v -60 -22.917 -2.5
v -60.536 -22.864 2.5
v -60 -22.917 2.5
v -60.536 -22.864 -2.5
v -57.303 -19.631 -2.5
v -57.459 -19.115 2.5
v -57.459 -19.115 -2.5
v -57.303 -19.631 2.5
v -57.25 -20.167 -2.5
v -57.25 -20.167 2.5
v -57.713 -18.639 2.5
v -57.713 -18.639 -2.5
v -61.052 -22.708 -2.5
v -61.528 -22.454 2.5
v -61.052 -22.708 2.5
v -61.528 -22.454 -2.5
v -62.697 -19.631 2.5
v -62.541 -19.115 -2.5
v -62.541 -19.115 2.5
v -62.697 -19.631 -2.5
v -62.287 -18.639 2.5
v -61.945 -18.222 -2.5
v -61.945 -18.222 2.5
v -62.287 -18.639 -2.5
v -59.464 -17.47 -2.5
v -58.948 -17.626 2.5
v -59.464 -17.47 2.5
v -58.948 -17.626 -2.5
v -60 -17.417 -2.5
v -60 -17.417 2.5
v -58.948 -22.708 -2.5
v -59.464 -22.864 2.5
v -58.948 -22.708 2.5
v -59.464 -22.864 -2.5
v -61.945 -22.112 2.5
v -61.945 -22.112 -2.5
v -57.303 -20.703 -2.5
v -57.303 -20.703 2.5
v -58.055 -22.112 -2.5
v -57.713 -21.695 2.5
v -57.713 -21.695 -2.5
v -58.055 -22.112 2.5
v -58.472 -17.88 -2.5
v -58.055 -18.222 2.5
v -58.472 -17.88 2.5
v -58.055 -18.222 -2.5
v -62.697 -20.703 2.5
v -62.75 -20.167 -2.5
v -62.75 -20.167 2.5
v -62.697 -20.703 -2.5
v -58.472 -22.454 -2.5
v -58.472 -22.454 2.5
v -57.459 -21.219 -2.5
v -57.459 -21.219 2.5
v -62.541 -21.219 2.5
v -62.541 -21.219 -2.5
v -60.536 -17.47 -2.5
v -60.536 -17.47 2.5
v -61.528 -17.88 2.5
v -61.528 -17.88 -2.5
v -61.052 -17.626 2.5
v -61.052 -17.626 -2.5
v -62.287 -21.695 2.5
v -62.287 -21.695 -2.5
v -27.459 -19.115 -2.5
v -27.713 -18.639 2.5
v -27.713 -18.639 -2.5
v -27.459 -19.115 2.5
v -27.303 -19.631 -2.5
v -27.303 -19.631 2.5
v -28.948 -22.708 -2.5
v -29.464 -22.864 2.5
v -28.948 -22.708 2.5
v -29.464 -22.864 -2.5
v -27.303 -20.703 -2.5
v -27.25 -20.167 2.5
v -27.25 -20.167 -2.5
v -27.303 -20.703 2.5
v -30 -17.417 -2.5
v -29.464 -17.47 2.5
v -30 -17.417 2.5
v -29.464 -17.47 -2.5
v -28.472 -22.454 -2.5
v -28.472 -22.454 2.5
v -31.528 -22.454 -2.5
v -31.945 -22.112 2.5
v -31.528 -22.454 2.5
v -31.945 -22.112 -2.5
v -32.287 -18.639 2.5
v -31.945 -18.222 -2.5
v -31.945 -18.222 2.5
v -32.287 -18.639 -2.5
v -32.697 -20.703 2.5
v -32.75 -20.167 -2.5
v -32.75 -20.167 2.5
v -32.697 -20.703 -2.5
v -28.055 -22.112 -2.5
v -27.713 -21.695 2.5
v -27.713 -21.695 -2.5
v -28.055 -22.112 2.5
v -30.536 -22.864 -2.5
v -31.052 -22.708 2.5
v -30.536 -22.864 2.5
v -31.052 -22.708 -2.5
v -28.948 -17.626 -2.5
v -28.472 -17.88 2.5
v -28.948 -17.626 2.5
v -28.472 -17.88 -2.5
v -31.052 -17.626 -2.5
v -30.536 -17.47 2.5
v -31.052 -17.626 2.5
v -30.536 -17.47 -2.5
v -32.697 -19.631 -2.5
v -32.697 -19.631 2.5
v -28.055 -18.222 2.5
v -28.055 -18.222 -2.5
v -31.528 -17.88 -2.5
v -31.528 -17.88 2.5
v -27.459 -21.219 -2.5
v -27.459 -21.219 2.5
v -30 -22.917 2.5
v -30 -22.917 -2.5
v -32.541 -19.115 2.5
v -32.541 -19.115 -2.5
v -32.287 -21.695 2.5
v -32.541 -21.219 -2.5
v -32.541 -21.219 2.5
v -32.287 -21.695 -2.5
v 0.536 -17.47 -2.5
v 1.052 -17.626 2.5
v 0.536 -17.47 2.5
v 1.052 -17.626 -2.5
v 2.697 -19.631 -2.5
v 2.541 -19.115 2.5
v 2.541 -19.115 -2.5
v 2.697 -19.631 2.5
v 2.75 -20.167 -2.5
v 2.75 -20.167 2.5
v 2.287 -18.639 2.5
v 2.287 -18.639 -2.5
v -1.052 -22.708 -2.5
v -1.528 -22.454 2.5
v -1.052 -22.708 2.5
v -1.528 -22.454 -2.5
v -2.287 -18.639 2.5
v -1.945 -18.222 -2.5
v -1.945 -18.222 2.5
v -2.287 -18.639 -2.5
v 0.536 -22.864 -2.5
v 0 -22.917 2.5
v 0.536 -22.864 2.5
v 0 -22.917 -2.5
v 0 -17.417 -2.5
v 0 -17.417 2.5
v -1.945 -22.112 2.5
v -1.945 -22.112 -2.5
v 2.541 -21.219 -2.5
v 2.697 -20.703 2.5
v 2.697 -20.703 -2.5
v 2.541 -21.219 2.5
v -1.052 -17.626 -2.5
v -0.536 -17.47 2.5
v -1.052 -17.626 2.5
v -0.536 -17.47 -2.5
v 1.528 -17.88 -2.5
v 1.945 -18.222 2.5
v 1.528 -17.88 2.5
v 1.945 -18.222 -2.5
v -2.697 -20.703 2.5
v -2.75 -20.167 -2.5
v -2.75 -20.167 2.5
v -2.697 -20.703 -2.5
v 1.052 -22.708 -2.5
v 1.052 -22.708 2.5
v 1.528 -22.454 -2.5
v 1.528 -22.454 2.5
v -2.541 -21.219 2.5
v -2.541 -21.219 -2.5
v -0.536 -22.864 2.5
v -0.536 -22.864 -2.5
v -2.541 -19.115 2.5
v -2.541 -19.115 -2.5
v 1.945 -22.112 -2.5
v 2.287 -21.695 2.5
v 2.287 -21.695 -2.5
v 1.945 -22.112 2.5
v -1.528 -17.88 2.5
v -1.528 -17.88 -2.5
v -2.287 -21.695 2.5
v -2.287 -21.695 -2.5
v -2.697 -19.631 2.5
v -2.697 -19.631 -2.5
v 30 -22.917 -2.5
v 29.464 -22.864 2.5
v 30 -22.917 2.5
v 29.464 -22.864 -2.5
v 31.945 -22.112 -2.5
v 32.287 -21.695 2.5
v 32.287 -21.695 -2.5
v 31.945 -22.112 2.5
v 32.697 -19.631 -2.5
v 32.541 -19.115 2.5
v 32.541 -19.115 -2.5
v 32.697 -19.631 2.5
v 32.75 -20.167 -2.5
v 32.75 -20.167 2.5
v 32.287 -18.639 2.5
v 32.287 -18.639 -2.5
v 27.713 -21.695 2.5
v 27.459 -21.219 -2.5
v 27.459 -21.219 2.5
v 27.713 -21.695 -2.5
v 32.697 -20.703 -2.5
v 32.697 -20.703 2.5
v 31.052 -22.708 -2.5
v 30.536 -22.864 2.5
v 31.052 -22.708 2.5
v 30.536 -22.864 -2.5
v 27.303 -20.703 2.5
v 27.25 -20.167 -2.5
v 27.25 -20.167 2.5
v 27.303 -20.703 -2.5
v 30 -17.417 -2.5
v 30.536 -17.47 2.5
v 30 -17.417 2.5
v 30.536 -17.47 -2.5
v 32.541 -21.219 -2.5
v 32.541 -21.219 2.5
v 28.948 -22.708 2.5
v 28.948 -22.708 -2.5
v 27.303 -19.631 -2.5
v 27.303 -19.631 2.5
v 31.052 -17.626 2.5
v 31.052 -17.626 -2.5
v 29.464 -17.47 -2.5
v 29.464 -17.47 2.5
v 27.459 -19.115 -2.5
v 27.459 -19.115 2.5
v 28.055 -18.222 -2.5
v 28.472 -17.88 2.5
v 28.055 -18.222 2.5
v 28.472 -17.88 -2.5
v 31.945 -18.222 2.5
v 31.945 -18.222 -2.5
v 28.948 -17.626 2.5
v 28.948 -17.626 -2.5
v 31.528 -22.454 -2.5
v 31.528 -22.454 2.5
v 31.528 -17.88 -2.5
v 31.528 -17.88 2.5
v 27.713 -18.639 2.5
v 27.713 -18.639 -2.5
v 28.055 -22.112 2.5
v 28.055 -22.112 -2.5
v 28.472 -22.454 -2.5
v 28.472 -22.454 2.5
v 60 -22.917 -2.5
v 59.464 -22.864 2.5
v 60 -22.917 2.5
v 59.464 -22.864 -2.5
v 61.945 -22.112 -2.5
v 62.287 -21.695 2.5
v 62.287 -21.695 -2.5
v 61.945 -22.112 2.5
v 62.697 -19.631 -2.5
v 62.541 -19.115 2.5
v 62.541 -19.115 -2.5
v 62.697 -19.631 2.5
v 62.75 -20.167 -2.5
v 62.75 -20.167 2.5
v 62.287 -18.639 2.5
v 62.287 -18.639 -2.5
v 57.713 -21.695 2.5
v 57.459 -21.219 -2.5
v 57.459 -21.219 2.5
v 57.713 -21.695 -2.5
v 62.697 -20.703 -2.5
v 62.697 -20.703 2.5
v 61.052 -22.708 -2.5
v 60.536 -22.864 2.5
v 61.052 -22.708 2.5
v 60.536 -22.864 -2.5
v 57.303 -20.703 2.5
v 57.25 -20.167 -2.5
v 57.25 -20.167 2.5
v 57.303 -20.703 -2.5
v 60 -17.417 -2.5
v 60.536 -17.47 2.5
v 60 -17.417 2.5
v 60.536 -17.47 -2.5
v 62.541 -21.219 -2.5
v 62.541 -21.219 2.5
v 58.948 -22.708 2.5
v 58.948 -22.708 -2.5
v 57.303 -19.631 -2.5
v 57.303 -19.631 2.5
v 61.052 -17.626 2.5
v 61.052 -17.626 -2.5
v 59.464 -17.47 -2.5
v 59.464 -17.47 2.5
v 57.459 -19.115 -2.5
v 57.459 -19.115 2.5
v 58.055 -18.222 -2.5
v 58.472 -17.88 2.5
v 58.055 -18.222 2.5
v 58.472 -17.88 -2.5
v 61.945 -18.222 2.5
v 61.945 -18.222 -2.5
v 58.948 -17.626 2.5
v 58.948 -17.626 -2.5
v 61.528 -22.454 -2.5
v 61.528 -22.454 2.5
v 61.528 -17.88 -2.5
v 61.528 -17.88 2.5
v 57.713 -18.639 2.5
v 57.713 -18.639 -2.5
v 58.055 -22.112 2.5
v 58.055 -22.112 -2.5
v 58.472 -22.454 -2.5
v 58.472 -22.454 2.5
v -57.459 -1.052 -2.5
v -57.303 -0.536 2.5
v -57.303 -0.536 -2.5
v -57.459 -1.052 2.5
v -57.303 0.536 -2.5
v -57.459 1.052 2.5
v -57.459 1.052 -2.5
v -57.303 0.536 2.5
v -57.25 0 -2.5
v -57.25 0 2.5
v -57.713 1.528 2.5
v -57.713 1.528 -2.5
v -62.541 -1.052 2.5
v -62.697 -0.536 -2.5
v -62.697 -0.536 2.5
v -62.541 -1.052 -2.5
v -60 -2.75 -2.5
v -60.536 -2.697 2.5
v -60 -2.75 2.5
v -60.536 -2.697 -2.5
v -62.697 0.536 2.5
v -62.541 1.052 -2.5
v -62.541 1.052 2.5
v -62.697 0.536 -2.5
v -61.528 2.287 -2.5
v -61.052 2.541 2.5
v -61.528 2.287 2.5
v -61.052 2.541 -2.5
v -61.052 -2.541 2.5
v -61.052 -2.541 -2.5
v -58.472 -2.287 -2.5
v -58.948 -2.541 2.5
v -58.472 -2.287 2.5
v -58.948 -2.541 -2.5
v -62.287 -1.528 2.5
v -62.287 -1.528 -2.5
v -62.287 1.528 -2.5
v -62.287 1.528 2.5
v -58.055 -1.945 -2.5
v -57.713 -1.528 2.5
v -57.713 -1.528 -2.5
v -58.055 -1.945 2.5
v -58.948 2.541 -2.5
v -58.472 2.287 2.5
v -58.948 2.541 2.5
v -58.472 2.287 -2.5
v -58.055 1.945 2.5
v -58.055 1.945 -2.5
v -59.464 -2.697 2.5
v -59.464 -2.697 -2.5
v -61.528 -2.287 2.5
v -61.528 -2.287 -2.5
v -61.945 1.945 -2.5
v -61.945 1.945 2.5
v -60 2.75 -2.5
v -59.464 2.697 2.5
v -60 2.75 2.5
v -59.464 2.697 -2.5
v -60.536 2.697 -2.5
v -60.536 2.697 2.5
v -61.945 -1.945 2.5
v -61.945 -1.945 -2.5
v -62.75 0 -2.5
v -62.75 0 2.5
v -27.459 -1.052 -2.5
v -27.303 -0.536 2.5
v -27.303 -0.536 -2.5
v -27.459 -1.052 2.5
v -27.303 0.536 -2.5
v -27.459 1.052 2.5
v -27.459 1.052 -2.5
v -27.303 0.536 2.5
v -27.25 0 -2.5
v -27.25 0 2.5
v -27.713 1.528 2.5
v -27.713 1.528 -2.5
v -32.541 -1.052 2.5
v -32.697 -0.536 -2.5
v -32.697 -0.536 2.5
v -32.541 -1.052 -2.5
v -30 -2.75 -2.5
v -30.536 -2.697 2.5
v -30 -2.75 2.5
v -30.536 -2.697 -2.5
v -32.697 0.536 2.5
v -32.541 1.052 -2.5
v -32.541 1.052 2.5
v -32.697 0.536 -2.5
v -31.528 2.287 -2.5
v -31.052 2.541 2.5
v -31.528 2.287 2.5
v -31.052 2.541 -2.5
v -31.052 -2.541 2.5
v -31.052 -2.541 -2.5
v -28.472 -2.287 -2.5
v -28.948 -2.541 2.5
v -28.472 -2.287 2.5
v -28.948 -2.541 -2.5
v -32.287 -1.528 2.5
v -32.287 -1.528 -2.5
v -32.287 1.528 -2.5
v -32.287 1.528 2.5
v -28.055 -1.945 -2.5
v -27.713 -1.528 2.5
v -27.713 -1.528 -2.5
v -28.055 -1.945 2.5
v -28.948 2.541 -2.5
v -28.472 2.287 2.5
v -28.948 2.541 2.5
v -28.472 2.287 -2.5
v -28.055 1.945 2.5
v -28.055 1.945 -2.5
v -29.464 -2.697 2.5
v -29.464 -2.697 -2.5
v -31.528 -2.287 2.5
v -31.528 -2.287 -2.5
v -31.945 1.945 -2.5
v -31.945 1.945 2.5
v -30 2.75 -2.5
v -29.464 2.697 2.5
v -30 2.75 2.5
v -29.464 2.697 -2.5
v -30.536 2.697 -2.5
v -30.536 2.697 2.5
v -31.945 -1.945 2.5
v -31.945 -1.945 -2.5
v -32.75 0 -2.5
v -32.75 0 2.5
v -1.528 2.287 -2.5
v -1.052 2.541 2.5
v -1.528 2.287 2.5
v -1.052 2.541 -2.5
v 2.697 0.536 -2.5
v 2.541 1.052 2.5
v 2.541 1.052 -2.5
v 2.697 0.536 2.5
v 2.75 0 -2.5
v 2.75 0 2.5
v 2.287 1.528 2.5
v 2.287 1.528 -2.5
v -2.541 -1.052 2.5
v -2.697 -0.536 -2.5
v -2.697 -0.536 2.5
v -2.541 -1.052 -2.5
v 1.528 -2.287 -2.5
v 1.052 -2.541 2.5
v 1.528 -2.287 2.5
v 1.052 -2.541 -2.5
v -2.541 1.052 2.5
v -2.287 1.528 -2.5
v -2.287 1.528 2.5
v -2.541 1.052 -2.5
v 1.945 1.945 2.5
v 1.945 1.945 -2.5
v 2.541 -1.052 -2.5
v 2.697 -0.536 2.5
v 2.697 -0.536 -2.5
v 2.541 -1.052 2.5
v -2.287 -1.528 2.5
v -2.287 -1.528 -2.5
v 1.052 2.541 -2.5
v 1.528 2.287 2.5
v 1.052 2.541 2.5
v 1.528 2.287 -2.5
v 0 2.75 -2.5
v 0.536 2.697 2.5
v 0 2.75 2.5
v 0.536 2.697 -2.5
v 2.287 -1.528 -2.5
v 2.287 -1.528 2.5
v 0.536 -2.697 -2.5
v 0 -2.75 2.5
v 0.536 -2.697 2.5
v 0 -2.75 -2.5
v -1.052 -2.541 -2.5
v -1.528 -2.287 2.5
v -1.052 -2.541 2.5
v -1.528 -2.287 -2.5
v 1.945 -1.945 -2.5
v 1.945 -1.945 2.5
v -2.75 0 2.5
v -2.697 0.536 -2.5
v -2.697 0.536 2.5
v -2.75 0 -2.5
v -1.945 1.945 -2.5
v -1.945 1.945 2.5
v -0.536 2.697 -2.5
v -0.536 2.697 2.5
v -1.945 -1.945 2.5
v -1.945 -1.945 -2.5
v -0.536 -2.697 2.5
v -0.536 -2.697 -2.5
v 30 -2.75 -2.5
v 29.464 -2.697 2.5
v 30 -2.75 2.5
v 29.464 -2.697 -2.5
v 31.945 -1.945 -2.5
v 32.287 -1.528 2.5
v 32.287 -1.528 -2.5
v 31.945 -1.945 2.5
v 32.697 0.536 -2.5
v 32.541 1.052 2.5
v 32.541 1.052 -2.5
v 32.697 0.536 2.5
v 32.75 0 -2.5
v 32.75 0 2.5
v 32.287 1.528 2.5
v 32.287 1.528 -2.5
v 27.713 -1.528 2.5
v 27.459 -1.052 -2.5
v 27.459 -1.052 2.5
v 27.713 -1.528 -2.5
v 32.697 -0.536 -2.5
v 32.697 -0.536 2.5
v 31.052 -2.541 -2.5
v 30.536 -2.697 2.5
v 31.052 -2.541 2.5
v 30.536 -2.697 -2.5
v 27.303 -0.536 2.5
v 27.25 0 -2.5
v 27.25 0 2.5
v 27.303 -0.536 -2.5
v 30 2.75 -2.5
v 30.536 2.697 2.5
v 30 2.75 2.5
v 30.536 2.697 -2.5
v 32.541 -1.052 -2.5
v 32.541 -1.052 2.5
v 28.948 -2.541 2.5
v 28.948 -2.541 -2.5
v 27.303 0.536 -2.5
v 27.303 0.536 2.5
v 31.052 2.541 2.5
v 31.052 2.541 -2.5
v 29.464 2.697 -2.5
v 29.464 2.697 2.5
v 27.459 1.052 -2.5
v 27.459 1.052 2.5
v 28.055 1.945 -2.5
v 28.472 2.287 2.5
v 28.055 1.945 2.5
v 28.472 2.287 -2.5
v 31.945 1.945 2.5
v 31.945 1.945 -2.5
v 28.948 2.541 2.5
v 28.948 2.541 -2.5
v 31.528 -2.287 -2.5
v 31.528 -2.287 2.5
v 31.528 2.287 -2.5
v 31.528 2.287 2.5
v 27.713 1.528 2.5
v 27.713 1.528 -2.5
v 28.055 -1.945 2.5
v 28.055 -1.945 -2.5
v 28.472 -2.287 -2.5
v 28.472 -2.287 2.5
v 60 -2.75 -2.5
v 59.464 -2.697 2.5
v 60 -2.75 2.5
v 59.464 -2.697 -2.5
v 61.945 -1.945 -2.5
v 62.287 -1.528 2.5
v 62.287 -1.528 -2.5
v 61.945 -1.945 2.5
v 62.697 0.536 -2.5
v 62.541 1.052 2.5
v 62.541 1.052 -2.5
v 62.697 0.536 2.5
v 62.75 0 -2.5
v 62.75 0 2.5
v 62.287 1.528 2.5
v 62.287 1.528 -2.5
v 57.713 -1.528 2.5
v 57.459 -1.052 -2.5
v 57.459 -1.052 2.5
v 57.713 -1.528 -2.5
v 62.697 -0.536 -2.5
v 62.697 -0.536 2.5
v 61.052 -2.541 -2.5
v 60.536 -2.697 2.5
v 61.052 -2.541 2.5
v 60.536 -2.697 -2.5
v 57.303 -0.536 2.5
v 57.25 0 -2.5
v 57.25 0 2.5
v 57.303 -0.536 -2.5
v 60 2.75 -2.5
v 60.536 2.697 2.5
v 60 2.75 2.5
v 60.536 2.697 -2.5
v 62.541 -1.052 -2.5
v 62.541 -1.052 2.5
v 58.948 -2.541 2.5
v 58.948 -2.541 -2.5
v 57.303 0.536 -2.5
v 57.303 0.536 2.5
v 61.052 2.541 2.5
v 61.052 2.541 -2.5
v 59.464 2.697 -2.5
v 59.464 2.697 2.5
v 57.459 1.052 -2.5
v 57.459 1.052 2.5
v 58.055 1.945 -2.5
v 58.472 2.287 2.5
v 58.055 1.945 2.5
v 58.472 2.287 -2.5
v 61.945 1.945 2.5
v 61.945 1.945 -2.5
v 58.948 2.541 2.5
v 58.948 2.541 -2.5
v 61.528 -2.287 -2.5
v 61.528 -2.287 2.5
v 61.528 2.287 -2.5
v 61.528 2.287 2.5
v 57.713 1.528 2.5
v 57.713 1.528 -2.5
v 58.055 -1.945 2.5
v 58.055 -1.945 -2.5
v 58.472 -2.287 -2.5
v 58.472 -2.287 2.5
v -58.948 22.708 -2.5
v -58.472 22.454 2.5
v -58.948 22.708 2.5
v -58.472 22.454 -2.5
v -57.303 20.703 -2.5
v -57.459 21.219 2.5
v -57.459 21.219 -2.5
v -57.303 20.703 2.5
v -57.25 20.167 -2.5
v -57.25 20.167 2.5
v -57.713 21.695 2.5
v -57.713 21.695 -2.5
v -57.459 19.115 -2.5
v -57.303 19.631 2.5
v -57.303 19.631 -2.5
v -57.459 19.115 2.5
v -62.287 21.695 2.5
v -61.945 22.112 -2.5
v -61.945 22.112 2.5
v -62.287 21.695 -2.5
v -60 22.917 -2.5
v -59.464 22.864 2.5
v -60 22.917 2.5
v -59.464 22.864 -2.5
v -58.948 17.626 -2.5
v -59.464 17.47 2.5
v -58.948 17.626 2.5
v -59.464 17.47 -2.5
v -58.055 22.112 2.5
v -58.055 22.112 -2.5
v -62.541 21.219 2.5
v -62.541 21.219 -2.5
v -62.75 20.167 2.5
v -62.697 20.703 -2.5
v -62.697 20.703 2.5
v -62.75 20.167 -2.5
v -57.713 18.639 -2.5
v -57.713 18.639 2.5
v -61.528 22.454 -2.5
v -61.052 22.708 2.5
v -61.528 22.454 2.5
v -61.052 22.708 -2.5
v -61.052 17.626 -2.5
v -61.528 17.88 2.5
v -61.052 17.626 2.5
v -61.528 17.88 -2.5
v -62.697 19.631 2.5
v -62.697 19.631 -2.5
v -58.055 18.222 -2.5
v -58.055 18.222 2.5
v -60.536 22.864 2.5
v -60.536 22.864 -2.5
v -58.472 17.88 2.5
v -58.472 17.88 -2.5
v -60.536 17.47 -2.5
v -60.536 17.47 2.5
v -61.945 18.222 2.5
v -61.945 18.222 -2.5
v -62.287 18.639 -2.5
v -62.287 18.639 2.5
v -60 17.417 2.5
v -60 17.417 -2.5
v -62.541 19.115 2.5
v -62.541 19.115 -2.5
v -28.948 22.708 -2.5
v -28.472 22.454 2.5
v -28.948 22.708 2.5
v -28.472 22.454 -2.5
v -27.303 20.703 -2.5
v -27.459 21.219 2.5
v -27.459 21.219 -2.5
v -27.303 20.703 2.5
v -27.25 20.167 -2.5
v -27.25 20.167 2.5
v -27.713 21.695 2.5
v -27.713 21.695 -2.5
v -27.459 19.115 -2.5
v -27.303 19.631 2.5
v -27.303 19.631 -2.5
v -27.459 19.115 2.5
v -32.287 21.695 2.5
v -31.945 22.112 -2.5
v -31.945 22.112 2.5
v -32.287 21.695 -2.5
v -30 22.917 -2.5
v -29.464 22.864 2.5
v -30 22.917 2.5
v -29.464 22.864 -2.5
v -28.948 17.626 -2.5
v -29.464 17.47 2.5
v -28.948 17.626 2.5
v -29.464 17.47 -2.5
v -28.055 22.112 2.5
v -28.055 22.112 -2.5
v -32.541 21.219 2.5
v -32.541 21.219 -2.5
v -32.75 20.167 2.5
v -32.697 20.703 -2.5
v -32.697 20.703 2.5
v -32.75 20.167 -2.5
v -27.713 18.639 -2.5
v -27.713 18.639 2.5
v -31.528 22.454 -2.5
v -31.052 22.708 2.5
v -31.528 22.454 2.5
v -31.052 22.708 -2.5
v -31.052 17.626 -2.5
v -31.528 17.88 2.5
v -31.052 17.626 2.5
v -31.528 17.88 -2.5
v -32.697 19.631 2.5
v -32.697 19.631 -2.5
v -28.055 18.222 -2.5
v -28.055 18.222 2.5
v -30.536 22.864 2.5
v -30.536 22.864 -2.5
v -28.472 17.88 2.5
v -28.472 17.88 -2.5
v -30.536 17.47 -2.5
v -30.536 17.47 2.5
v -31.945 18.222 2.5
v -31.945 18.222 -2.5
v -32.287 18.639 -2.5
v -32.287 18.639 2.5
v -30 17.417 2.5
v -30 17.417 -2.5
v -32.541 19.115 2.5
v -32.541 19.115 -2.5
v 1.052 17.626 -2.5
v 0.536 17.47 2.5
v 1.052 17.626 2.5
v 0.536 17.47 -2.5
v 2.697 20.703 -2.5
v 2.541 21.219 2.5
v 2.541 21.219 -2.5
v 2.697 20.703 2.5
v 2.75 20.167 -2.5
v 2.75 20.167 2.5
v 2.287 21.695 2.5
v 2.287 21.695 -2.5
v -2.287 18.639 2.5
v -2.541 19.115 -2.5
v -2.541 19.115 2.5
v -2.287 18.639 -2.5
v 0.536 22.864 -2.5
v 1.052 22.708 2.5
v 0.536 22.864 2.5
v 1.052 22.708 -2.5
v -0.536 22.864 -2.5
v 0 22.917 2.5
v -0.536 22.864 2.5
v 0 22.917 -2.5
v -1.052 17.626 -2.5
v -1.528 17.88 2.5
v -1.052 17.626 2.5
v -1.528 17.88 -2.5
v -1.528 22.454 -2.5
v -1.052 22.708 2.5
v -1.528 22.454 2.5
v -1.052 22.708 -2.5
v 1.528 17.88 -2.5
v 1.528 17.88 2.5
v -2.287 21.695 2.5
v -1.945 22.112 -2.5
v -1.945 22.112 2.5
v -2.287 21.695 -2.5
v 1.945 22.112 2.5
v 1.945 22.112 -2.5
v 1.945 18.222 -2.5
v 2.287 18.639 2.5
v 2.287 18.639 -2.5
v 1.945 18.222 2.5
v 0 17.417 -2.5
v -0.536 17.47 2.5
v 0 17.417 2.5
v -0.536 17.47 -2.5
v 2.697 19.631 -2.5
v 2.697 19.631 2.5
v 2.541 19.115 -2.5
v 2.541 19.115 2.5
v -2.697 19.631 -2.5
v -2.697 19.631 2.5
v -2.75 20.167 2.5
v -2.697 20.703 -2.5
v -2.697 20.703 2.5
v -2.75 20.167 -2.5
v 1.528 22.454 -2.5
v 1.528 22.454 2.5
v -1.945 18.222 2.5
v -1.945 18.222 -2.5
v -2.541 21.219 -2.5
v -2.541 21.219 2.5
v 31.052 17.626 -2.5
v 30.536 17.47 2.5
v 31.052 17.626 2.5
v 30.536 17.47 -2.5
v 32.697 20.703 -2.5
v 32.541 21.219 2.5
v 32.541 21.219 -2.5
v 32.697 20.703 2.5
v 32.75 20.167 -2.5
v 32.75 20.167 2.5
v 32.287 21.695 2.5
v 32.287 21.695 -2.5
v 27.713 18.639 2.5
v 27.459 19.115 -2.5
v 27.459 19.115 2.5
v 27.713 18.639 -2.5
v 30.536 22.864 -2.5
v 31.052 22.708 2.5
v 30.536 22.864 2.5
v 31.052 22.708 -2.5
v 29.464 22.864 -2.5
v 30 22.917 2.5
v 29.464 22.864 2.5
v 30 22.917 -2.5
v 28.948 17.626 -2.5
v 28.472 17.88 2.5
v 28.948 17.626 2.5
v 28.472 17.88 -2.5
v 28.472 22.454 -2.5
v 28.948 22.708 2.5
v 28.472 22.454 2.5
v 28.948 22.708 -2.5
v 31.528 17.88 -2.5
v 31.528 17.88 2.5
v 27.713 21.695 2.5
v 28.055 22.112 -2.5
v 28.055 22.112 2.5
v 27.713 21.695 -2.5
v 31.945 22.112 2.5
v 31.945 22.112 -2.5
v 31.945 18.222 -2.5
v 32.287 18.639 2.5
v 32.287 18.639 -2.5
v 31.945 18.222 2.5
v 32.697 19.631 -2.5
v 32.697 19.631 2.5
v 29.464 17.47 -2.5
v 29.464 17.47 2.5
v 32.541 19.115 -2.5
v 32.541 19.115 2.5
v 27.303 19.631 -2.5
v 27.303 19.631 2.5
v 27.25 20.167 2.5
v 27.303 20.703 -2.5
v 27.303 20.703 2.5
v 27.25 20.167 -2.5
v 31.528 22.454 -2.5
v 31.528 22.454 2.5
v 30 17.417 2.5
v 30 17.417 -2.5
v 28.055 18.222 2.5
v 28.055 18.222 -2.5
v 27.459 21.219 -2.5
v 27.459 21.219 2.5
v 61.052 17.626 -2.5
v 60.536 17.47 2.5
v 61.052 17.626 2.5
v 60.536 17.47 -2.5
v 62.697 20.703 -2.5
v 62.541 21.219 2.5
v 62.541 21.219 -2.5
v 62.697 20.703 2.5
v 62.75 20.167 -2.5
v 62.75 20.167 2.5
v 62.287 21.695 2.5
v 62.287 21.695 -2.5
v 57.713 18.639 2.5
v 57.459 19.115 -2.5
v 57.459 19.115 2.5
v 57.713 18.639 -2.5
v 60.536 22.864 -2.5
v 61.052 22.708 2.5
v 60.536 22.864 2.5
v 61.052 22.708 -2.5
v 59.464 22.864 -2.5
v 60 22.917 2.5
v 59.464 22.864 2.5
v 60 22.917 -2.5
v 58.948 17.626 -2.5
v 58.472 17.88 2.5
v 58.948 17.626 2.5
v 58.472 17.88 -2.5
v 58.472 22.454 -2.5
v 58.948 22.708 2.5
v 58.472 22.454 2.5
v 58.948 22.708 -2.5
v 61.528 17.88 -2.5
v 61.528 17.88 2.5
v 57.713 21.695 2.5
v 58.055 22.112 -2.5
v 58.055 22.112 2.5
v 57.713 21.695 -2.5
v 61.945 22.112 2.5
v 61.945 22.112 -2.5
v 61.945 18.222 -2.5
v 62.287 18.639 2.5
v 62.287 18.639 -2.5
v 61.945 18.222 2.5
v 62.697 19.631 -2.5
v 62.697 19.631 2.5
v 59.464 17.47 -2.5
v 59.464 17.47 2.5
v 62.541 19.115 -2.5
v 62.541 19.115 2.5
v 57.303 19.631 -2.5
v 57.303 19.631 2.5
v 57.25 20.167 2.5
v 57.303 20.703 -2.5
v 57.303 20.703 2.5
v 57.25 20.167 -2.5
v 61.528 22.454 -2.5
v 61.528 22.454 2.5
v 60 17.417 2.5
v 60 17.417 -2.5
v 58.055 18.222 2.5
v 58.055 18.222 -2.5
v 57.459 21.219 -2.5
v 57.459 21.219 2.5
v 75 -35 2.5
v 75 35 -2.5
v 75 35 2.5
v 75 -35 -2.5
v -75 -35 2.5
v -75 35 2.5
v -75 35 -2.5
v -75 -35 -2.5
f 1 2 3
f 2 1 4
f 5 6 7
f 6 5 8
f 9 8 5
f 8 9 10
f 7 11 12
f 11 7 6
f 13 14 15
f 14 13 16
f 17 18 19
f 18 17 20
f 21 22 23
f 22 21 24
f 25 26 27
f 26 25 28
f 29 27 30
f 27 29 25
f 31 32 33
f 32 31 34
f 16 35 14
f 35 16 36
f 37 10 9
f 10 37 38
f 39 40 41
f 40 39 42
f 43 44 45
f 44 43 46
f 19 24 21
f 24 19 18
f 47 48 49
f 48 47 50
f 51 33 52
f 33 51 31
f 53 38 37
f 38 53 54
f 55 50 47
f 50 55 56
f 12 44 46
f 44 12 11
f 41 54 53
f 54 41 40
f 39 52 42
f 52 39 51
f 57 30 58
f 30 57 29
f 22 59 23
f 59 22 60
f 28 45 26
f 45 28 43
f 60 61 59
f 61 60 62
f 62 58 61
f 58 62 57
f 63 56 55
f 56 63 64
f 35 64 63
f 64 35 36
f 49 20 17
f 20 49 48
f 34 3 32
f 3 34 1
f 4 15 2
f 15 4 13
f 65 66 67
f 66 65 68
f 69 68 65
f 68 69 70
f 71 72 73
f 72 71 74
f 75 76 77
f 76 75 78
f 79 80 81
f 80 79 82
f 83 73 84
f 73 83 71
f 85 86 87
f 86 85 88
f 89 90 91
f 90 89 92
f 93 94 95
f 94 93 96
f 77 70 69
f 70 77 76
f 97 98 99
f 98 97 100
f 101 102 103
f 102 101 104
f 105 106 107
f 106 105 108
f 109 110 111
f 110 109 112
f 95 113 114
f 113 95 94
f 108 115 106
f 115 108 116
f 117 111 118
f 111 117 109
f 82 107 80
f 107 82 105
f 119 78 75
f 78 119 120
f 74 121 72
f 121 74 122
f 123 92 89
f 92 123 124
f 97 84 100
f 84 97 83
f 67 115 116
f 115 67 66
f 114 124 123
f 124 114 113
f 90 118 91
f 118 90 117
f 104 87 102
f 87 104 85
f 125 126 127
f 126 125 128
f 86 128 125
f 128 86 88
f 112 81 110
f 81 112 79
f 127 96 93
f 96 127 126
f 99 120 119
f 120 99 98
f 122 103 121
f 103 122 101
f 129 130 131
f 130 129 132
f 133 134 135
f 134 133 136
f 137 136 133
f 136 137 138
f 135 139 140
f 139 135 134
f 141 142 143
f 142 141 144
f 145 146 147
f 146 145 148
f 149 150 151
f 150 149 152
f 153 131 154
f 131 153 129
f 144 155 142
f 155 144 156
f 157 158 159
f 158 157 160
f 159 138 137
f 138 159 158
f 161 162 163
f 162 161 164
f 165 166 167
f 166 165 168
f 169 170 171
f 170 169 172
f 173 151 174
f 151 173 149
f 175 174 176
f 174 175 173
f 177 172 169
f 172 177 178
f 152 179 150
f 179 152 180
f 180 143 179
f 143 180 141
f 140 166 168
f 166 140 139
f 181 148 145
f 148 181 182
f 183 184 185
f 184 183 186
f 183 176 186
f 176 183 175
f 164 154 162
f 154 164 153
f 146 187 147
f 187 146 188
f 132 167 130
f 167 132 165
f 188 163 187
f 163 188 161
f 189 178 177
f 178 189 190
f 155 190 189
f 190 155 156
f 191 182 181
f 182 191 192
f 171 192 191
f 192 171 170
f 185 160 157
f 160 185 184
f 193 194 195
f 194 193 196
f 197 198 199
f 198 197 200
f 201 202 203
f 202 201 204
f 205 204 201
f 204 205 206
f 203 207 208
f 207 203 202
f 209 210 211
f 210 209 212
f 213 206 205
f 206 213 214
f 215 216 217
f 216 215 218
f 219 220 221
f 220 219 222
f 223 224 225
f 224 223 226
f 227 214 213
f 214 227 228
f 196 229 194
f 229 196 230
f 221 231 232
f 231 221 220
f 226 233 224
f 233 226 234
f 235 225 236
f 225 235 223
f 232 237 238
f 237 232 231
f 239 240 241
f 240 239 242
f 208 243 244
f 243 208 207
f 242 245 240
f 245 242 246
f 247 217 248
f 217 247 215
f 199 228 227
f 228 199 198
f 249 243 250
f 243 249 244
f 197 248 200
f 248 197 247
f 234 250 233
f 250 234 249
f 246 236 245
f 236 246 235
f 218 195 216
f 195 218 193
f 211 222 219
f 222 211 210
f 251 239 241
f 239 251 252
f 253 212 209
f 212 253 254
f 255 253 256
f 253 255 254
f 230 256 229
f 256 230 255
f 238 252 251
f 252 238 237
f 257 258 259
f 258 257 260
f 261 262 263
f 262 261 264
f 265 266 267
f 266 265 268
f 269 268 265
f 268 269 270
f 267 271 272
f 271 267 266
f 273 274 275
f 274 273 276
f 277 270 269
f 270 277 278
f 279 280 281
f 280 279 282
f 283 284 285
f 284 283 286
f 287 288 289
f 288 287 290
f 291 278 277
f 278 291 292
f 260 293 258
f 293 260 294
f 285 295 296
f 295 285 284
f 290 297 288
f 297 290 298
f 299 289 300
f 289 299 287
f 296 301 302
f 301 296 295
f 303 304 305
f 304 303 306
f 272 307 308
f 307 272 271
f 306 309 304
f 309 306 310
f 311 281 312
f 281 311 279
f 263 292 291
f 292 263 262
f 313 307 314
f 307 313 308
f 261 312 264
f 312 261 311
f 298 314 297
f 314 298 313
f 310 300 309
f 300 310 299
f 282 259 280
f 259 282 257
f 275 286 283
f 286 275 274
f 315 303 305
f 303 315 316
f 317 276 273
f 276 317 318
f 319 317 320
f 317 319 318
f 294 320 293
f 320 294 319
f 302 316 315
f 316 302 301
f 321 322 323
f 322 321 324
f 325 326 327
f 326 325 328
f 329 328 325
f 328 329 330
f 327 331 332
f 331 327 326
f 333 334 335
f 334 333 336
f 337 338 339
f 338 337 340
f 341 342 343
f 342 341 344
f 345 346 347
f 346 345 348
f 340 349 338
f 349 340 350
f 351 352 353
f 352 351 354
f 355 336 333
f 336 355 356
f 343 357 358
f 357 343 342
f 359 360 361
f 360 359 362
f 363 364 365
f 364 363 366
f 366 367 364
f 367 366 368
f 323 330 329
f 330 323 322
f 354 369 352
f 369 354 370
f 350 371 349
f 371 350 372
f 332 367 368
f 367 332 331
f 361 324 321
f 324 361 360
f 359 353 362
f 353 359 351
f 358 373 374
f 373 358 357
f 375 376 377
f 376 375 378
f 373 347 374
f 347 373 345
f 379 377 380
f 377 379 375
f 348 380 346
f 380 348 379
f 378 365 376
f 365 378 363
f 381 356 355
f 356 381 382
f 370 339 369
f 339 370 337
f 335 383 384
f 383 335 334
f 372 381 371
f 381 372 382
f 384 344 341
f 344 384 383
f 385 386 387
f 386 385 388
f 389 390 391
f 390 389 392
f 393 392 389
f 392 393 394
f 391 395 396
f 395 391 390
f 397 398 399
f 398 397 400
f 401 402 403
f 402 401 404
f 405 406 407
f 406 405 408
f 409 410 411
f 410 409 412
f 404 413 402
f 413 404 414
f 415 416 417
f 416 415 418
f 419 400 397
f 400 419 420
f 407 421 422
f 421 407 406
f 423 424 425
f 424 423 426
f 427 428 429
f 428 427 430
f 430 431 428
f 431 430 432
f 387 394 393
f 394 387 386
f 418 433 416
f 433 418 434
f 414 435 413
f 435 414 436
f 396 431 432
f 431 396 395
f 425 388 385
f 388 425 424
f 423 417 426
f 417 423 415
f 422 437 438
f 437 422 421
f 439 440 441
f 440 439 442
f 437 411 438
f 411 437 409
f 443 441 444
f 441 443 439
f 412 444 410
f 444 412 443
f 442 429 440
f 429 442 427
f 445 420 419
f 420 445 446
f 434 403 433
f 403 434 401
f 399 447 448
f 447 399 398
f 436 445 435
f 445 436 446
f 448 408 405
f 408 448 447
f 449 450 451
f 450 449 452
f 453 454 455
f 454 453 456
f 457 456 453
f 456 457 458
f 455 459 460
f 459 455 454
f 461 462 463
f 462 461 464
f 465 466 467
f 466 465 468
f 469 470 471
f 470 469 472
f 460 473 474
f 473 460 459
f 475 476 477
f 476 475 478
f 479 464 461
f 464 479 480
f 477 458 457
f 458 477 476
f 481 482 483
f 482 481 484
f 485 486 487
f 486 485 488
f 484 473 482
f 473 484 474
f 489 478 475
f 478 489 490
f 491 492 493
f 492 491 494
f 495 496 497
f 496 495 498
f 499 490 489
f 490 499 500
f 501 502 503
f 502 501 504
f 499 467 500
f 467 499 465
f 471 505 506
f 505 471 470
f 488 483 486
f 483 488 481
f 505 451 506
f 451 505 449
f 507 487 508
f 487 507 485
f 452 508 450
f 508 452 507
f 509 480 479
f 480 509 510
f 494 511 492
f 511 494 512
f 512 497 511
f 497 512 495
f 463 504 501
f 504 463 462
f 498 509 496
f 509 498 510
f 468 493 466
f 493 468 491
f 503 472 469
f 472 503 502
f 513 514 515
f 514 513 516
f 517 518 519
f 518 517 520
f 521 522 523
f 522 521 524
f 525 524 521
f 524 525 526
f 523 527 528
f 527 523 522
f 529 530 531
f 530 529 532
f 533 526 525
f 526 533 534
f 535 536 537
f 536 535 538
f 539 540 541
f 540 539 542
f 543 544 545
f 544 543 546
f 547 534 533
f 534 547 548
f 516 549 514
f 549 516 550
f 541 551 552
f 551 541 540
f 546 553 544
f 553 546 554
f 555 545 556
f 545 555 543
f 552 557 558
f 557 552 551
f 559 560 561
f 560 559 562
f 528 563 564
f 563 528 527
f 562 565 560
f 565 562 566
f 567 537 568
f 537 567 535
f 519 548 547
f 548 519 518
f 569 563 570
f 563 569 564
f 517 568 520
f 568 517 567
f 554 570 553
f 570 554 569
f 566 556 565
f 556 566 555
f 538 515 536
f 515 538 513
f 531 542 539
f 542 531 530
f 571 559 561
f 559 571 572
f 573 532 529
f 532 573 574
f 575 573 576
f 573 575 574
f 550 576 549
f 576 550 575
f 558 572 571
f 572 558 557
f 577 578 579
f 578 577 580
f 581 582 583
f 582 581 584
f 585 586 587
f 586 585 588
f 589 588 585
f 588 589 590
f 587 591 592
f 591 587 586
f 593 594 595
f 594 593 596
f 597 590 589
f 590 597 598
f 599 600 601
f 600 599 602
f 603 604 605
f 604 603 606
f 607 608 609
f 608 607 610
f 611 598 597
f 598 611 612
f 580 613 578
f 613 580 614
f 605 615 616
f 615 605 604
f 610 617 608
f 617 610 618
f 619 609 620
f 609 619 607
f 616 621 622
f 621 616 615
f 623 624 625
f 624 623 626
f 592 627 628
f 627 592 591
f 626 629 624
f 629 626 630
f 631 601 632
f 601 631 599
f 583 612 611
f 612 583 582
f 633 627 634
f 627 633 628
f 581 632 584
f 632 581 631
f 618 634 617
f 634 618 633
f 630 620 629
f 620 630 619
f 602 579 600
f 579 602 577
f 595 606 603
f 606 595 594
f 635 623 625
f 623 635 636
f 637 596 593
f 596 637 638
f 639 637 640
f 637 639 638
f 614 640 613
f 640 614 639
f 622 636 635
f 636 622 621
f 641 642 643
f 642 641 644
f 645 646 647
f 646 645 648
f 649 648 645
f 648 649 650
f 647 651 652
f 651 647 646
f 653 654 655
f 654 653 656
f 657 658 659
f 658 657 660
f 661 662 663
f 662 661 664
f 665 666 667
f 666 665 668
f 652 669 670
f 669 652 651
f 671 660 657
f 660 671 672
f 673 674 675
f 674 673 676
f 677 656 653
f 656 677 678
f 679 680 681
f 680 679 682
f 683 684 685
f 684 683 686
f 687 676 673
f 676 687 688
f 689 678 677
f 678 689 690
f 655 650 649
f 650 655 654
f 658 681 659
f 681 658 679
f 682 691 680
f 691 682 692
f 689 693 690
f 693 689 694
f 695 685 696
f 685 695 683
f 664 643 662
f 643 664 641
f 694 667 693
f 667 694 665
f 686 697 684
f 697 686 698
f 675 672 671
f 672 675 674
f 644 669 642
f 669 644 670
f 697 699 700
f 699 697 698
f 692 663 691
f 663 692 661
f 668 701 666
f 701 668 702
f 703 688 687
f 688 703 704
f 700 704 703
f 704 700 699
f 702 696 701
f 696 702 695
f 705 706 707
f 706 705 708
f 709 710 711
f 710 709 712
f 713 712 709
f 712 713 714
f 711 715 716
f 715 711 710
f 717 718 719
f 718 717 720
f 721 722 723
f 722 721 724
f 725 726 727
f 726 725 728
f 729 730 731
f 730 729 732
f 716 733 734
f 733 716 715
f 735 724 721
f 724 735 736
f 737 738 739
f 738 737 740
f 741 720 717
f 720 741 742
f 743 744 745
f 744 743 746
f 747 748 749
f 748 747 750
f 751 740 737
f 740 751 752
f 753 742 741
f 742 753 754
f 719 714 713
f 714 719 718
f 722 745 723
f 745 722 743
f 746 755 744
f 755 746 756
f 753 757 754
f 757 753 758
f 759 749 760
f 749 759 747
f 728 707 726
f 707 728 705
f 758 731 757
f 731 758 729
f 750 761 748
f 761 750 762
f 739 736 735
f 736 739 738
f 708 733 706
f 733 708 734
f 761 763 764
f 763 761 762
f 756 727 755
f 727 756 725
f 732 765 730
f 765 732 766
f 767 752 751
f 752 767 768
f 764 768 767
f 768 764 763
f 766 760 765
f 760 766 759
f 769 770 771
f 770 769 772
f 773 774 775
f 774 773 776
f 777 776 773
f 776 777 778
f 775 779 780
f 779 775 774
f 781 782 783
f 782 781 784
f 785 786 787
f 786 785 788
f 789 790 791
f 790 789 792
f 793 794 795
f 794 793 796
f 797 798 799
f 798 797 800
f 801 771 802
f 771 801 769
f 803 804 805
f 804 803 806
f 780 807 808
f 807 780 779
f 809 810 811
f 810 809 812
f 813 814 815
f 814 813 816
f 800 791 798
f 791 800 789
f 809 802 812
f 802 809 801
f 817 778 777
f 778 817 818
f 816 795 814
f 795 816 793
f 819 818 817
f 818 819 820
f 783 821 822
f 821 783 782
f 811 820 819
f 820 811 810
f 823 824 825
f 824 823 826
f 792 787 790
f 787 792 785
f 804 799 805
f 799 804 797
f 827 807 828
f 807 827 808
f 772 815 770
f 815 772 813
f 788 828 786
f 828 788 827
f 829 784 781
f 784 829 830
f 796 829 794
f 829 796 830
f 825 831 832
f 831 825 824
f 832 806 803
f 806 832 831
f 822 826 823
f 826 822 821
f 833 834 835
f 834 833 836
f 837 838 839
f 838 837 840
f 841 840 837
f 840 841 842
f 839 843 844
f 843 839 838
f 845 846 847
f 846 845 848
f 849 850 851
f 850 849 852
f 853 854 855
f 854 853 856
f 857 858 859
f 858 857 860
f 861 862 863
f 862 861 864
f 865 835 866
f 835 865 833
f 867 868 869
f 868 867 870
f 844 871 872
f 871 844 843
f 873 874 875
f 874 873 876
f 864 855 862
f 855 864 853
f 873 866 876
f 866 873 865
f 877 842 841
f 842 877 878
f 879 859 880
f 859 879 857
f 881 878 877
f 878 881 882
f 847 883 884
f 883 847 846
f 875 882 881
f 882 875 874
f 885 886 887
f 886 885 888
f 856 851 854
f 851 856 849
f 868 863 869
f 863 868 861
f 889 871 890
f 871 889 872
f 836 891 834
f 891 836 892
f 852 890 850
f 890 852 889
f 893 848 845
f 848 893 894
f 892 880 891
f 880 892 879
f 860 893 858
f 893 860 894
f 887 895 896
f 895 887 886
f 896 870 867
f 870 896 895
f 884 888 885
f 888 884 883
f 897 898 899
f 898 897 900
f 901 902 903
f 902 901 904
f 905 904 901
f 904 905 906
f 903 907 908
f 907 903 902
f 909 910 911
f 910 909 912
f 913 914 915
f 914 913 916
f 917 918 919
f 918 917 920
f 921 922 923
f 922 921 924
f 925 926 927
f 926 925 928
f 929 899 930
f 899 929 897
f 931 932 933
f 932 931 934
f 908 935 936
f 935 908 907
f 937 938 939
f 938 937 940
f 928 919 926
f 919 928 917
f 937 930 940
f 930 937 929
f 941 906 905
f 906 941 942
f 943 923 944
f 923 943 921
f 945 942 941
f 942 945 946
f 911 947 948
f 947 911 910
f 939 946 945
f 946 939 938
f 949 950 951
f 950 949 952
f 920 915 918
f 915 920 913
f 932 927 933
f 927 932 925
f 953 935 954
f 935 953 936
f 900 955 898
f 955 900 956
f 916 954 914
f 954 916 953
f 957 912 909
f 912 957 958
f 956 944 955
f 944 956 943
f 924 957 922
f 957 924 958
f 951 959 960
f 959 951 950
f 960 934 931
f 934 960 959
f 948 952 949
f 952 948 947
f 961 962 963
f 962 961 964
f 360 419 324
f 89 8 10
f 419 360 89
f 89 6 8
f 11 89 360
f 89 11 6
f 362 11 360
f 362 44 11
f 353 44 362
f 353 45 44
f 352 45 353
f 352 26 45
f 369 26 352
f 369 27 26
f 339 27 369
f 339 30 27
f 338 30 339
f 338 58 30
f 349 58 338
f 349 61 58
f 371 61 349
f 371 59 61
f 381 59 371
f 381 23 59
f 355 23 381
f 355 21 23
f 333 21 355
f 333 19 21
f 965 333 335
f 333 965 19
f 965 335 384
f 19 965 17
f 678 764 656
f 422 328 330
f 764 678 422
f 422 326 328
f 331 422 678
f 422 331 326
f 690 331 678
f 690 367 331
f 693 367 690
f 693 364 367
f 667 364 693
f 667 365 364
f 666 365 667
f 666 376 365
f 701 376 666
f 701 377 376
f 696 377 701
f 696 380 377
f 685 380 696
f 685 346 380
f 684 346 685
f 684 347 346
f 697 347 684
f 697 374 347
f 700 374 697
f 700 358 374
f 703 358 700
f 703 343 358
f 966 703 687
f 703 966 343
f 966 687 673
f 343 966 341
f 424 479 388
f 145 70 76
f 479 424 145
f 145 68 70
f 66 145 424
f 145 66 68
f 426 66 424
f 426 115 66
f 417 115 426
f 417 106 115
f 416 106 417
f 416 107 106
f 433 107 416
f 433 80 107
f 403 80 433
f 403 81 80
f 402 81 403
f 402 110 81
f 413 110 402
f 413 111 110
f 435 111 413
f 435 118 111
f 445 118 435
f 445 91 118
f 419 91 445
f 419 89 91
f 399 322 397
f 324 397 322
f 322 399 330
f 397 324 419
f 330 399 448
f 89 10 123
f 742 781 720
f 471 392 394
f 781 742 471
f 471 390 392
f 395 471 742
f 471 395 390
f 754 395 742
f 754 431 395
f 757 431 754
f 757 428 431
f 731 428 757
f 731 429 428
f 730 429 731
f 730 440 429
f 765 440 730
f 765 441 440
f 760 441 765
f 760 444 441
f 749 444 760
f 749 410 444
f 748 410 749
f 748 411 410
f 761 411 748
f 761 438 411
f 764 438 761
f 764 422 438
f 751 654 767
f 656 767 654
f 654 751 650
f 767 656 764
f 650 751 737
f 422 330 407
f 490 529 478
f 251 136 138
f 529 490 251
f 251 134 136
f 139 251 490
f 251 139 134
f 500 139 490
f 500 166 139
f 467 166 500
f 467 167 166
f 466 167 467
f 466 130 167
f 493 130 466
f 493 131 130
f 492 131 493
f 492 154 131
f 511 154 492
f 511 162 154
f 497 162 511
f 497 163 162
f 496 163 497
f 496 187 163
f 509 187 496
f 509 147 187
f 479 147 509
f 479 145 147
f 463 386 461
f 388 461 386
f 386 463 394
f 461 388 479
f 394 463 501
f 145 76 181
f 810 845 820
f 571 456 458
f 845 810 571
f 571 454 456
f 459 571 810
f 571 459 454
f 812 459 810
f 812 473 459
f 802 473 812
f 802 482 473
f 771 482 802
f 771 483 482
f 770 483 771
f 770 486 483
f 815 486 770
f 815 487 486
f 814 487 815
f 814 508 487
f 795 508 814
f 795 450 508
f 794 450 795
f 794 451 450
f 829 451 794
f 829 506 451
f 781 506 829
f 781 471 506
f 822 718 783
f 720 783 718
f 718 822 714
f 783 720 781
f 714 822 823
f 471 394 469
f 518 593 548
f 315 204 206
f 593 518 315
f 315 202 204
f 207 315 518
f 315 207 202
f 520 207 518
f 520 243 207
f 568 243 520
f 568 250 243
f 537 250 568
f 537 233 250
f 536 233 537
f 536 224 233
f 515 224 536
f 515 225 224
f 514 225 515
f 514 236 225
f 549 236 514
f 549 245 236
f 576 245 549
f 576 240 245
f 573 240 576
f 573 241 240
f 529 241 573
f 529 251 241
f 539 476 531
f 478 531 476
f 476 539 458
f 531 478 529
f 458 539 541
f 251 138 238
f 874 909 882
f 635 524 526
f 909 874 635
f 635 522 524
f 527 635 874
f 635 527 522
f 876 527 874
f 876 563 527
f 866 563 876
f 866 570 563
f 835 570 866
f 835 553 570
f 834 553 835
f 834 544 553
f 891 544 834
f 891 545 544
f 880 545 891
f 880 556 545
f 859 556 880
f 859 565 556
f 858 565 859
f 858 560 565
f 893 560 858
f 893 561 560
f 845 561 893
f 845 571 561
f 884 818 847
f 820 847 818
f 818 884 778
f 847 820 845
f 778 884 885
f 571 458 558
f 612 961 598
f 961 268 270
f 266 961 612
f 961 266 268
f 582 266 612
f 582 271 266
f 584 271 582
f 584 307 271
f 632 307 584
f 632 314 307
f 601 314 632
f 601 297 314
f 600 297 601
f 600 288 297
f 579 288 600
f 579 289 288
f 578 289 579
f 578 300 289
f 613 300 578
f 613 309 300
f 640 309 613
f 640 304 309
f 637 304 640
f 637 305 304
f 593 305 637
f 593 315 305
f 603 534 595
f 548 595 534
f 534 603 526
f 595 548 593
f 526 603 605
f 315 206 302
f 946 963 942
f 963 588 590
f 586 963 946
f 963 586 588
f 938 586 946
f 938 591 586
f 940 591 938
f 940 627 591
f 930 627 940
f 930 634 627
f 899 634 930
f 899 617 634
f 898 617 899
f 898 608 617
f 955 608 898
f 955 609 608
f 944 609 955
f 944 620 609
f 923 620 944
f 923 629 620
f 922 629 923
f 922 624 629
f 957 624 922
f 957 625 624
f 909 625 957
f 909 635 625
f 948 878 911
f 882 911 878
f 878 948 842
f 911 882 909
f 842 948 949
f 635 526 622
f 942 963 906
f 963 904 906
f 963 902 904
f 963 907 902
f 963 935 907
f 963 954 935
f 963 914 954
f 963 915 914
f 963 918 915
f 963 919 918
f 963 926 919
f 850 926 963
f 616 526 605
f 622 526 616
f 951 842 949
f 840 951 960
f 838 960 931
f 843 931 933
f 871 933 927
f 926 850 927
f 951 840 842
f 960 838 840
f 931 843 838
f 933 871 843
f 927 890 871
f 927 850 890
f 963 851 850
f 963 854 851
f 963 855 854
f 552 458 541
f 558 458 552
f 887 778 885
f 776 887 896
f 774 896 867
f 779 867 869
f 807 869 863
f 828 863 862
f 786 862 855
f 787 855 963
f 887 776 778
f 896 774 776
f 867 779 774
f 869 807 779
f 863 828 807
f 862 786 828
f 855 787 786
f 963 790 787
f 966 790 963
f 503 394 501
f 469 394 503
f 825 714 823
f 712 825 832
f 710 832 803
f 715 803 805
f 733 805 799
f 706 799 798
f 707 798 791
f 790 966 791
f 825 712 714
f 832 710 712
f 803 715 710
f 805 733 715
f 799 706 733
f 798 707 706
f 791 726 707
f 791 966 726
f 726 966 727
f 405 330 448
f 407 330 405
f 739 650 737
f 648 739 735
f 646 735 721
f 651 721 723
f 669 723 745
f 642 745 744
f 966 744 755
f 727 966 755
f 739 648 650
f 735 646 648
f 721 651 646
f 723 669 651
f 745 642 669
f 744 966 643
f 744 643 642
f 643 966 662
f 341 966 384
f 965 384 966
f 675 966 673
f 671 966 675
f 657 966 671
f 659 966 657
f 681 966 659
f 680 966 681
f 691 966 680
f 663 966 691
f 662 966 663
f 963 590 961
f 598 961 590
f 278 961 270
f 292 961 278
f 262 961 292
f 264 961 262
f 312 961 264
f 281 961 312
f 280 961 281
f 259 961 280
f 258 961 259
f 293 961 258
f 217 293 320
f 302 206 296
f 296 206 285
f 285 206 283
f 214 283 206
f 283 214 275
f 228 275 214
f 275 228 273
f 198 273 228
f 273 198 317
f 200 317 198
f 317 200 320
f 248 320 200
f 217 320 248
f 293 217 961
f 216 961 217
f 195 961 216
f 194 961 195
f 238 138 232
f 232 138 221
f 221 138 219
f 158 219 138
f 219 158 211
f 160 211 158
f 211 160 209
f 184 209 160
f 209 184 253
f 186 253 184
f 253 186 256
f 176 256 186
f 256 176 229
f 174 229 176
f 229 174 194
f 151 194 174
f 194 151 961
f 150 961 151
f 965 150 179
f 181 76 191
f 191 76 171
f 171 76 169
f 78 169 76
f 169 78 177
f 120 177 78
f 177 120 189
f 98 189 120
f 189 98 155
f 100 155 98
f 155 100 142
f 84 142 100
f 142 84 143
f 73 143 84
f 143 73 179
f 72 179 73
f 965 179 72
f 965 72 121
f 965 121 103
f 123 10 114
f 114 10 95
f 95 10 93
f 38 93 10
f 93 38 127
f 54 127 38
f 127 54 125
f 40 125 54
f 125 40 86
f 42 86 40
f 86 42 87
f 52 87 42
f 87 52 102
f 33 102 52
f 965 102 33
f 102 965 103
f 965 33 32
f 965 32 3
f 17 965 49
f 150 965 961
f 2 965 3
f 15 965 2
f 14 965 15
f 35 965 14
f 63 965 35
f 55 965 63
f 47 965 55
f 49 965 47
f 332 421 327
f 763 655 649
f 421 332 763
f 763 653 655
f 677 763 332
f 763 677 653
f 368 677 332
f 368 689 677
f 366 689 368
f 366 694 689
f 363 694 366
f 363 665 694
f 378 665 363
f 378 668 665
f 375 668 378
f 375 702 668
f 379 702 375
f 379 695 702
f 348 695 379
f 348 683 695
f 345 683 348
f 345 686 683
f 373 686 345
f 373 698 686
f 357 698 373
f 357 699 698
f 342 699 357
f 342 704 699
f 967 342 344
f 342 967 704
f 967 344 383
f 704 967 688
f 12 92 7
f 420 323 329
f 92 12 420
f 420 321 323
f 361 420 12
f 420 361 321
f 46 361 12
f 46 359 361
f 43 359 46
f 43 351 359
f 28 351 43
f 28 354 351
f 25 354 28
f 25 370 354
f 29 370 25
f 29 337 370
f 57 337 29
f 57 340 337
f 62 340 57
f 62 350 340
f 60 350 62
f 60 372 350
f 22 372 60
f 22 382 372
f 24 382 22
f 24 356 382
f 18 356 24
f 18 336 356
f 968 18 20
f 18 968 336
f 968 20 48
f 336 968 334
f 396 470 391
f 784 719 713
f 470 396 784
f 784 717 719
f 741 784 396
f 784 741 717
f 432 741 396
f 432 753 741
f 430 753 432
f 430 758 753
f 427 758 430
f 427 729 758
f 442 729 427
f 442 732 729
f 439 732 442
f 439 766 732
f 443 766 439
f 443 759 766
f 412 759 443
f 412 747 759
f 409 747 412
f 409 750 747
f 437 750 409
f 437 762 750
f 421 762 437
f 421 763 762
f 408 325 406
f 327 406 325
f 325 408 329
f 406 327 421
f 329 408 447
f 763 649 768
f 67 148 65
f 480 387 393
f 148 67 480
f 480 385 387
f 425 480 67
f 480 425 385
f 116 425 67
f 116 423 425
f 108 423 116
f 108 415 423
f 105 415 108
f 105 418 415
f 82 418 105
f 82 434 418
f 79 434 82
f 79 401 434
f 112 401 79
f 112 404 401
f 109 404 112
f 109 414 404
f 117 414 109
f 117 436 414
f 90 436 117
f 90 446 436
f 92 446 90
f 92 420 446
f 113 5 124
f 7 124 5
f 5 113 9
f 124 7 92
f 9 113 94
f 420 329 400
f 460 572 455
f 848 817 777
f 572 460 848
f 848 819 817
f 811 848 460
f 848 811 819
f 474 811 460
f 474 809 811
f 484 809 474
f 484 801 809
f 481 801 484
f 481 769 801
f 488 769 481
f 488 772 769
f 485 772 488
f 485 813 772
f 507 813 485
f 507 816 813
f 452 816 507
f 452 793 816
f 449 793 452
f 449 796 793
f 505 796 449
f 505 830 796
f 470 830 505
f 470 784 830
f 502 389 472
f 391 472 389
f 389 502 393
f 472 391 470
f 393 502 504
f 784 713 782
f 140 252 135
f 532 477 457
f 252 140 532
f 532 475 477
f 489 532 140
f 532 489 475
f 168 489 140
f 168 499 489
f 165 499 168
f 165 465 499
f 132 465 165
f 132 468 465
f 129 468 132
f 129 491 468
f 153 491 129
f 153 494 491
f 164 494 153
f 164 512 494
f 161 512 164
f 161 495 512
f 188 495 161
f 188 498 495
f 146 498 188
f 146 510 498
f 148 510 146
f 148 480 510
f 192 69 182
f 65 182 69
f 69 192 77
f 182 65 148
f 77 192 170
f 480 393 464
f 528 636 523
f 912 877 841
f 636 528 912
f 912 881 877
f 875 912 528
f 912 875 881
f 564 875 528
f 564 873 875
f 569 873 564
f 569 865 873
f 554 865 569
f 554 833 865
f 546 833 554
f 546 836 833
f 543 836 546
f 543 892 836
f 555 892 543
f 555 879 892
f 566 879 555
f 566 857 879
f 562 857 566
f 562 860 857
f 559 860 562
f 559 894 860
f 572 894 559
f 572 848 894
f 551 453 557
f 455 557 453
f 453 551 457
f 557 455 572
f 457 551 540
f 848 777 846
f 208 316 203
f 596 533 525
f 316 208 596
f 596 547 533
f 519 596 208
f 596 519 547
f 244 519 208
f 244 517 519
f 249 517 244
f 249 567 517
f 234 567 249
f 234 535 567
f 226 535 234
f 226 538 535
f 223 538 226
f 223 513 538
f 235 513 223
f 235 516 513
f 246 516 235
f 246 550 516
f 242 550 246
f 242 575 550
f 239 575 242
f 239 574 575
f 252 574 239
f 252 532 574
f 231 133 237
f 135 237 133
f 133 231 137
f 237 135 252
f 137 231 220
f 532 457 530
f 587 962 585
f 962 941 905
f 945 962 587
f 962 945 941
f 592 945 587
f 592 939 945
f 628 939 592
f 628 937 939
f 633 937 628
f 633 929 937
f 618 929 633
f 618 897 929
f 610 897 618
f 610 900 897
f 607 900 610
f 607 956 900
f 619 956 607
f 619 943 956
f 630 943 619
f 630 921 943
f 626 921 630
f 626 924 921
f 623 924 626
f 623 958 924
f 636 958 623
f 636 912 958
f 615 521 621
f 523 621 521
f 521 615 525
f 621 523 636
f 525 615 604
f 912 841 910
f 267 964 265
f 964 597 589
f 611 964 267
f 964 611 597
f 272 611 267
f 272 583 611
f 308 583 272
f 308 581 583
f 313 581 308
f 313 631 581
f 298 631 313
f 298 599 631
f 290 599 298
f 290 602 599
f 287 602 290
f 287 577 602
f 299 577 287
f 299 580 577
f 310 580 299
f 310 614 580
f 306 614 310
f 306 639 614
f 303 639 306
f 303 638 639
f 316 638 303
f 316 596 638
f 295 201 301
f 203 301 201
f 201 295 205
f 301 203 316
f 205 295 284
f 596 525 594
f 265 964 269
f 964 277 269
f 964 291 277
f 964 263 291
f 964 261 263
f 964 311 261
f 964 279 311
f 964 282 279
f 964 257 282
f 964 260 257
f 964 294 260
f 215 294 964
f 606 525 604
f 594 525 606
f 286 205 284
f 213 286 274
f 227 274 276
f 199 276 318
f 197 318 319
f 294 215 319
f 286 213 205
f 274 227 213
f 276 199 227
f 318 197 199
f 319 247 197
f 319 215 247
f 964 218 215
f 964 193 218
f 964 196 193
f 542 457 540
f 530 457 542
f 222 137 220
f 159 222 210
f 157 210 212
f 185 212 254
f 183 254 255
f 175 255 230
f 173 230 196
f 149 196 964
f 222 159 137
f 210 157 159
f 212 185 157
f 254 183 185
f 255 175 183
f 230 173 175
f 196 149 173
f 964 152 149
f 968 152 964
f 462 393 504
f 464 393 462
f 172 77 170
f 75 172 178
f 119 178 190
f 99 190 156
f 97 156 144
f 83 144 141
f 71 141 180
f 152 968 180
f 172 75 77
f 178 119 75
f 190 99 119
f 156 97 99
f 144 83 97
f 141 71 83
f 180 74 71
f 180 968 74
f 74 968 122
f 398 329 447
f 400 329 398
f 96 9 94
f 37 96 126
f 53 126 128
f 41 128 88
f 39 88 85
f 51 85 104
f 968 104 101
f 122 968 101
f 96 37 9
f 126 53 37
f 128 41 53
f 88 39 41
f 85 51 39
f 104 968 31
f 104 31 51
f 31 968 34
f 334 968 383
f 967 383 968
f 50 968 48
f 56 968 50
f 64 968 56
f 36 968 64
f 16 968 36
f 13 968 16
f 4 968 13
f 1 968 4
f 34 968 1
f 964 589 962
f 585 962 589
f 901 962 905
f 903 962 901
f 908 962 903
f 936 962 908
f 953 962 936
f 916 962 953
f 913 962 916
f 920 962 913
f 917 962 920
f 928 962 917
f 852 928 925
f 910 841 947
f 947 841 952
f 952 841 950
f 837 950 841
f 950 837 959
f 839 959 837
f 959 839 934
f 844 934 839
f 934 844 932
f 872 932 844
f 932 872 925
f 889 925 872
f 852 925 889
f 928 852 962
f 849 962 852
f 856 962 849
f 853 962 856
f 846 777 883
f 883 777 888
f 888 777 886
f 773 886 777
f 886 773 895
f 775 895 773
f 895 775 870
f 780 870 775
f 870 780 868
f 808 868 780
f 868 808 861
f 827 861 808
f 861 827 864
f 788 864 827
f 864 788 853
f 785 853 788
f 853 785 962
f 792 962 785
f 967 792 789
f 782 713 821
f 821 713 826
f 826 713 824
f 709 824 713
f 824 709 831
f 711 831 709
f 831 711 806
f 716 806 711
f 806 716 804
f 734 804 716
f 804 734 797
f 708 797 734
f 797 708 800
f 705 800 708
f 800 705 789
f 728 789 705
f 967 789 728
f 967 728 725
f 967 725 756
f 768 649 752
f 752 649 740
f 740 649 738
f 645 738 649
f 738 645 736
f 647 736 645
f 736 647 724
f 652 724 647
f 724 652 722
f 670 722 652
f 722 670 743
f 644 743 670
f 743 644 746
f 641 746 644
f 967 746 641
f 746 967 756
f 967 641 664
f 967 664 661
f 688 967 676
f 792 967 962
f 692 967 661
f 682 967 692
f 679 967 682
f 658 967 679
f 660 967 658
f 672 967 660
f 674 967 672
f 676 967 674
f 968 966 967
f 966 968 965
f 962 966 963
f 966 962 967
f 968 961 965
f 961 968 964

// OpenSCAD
$fn = 32;

// ----------------------------------------------------------------------
// Perforated panel 150 x 70 x 5
// 3 x 5 Ø5.5 holes, grid layout
// ----------------------------------------------------------------------

// --- parameters (mm) ---
panel = [150, 70, 5];  // overall size (x, y, z)
hole_d = 5.5;          // hole diameter
pitch_x = 30;          // hole pitch along X
pitch_y = 20.167;      // hole pitch along Y

// --- derived feature positions (mm) ---
margin = hole_d / 2 + 2;            // = 4.75   clearance from the panel edge
cols = floor((panel[0] - 2 * margin) / pitch_x) + 1;  // = 5   how many columns fit in X
rows = floor((panel[1] - 2 * margin) / pitch_y) + 1;  // = 3   how many rows fit in Y
span_x = (cols - 1) * pitch_x + 0;  // = 120   width of the field
span_y = (rows - 1) * pitch_y;      // = 40.33   height of the field
origin_x = -span_x / 2;             // = -60   X of the first hole
origin_y = -span_y / 2;             // = -20.17   Y of the first row
holes = rows * cols;                // = 15   holes in total
feature_centers = [
  [origin_x + 0 * pitch_x, origin_y + 0 * pitch_y],
  [origin_x + 1 * pitch_x, origin_y + 0 * pitch_y],
  [origin_x + 2 * pitch_x, origin_y + 0 * pitch_y],
  [origin_x + 3 * pitch_x, origin_y + 0 * pitch_y],
  [origin_x + 4 * pitch_x, origin_y + 0 * pitch_y],
  [origin_x + 0 * pitch_x, origin_y + 1 * pitch_y],
  [origin_x + 1 * pitch_x, origin_y + 1 * pitch_y],
  [origin_x + 2 * pitch_x, origin_y + 1 * pitch_y],
  [origin_x + 3 * pitch_x, origin_y + 1 * pitch_y],
  [origin_x + 4 * pitch_x, origin_y + 1 * pitch_y],
  [origin_x + 0 * pitch_x, origin_y + 2 * pitch_y],
  [origin_x + 1 * pitch_x, origin_y + 2 * pitch_y],
  [origin_x + 2 * pitch_x, origin_y + 2 * pitch_y],
  [origin_x + 3 * pitch_x, origin_y + 2 * pitch_y],
  [origin_x + 4 * pitch_x, origin_y + 2 * pitch_y]
];   // hole centres, used verbatim by the cutter loop

// panel outline, every hole through
difference() {
  cube(panel, center = true);
  for (centre = feature_centers)
    translate([centre[0], centre[1], 0])
      cylinder(d = hole_d, h = panel[2] + 2, center = true);
}
